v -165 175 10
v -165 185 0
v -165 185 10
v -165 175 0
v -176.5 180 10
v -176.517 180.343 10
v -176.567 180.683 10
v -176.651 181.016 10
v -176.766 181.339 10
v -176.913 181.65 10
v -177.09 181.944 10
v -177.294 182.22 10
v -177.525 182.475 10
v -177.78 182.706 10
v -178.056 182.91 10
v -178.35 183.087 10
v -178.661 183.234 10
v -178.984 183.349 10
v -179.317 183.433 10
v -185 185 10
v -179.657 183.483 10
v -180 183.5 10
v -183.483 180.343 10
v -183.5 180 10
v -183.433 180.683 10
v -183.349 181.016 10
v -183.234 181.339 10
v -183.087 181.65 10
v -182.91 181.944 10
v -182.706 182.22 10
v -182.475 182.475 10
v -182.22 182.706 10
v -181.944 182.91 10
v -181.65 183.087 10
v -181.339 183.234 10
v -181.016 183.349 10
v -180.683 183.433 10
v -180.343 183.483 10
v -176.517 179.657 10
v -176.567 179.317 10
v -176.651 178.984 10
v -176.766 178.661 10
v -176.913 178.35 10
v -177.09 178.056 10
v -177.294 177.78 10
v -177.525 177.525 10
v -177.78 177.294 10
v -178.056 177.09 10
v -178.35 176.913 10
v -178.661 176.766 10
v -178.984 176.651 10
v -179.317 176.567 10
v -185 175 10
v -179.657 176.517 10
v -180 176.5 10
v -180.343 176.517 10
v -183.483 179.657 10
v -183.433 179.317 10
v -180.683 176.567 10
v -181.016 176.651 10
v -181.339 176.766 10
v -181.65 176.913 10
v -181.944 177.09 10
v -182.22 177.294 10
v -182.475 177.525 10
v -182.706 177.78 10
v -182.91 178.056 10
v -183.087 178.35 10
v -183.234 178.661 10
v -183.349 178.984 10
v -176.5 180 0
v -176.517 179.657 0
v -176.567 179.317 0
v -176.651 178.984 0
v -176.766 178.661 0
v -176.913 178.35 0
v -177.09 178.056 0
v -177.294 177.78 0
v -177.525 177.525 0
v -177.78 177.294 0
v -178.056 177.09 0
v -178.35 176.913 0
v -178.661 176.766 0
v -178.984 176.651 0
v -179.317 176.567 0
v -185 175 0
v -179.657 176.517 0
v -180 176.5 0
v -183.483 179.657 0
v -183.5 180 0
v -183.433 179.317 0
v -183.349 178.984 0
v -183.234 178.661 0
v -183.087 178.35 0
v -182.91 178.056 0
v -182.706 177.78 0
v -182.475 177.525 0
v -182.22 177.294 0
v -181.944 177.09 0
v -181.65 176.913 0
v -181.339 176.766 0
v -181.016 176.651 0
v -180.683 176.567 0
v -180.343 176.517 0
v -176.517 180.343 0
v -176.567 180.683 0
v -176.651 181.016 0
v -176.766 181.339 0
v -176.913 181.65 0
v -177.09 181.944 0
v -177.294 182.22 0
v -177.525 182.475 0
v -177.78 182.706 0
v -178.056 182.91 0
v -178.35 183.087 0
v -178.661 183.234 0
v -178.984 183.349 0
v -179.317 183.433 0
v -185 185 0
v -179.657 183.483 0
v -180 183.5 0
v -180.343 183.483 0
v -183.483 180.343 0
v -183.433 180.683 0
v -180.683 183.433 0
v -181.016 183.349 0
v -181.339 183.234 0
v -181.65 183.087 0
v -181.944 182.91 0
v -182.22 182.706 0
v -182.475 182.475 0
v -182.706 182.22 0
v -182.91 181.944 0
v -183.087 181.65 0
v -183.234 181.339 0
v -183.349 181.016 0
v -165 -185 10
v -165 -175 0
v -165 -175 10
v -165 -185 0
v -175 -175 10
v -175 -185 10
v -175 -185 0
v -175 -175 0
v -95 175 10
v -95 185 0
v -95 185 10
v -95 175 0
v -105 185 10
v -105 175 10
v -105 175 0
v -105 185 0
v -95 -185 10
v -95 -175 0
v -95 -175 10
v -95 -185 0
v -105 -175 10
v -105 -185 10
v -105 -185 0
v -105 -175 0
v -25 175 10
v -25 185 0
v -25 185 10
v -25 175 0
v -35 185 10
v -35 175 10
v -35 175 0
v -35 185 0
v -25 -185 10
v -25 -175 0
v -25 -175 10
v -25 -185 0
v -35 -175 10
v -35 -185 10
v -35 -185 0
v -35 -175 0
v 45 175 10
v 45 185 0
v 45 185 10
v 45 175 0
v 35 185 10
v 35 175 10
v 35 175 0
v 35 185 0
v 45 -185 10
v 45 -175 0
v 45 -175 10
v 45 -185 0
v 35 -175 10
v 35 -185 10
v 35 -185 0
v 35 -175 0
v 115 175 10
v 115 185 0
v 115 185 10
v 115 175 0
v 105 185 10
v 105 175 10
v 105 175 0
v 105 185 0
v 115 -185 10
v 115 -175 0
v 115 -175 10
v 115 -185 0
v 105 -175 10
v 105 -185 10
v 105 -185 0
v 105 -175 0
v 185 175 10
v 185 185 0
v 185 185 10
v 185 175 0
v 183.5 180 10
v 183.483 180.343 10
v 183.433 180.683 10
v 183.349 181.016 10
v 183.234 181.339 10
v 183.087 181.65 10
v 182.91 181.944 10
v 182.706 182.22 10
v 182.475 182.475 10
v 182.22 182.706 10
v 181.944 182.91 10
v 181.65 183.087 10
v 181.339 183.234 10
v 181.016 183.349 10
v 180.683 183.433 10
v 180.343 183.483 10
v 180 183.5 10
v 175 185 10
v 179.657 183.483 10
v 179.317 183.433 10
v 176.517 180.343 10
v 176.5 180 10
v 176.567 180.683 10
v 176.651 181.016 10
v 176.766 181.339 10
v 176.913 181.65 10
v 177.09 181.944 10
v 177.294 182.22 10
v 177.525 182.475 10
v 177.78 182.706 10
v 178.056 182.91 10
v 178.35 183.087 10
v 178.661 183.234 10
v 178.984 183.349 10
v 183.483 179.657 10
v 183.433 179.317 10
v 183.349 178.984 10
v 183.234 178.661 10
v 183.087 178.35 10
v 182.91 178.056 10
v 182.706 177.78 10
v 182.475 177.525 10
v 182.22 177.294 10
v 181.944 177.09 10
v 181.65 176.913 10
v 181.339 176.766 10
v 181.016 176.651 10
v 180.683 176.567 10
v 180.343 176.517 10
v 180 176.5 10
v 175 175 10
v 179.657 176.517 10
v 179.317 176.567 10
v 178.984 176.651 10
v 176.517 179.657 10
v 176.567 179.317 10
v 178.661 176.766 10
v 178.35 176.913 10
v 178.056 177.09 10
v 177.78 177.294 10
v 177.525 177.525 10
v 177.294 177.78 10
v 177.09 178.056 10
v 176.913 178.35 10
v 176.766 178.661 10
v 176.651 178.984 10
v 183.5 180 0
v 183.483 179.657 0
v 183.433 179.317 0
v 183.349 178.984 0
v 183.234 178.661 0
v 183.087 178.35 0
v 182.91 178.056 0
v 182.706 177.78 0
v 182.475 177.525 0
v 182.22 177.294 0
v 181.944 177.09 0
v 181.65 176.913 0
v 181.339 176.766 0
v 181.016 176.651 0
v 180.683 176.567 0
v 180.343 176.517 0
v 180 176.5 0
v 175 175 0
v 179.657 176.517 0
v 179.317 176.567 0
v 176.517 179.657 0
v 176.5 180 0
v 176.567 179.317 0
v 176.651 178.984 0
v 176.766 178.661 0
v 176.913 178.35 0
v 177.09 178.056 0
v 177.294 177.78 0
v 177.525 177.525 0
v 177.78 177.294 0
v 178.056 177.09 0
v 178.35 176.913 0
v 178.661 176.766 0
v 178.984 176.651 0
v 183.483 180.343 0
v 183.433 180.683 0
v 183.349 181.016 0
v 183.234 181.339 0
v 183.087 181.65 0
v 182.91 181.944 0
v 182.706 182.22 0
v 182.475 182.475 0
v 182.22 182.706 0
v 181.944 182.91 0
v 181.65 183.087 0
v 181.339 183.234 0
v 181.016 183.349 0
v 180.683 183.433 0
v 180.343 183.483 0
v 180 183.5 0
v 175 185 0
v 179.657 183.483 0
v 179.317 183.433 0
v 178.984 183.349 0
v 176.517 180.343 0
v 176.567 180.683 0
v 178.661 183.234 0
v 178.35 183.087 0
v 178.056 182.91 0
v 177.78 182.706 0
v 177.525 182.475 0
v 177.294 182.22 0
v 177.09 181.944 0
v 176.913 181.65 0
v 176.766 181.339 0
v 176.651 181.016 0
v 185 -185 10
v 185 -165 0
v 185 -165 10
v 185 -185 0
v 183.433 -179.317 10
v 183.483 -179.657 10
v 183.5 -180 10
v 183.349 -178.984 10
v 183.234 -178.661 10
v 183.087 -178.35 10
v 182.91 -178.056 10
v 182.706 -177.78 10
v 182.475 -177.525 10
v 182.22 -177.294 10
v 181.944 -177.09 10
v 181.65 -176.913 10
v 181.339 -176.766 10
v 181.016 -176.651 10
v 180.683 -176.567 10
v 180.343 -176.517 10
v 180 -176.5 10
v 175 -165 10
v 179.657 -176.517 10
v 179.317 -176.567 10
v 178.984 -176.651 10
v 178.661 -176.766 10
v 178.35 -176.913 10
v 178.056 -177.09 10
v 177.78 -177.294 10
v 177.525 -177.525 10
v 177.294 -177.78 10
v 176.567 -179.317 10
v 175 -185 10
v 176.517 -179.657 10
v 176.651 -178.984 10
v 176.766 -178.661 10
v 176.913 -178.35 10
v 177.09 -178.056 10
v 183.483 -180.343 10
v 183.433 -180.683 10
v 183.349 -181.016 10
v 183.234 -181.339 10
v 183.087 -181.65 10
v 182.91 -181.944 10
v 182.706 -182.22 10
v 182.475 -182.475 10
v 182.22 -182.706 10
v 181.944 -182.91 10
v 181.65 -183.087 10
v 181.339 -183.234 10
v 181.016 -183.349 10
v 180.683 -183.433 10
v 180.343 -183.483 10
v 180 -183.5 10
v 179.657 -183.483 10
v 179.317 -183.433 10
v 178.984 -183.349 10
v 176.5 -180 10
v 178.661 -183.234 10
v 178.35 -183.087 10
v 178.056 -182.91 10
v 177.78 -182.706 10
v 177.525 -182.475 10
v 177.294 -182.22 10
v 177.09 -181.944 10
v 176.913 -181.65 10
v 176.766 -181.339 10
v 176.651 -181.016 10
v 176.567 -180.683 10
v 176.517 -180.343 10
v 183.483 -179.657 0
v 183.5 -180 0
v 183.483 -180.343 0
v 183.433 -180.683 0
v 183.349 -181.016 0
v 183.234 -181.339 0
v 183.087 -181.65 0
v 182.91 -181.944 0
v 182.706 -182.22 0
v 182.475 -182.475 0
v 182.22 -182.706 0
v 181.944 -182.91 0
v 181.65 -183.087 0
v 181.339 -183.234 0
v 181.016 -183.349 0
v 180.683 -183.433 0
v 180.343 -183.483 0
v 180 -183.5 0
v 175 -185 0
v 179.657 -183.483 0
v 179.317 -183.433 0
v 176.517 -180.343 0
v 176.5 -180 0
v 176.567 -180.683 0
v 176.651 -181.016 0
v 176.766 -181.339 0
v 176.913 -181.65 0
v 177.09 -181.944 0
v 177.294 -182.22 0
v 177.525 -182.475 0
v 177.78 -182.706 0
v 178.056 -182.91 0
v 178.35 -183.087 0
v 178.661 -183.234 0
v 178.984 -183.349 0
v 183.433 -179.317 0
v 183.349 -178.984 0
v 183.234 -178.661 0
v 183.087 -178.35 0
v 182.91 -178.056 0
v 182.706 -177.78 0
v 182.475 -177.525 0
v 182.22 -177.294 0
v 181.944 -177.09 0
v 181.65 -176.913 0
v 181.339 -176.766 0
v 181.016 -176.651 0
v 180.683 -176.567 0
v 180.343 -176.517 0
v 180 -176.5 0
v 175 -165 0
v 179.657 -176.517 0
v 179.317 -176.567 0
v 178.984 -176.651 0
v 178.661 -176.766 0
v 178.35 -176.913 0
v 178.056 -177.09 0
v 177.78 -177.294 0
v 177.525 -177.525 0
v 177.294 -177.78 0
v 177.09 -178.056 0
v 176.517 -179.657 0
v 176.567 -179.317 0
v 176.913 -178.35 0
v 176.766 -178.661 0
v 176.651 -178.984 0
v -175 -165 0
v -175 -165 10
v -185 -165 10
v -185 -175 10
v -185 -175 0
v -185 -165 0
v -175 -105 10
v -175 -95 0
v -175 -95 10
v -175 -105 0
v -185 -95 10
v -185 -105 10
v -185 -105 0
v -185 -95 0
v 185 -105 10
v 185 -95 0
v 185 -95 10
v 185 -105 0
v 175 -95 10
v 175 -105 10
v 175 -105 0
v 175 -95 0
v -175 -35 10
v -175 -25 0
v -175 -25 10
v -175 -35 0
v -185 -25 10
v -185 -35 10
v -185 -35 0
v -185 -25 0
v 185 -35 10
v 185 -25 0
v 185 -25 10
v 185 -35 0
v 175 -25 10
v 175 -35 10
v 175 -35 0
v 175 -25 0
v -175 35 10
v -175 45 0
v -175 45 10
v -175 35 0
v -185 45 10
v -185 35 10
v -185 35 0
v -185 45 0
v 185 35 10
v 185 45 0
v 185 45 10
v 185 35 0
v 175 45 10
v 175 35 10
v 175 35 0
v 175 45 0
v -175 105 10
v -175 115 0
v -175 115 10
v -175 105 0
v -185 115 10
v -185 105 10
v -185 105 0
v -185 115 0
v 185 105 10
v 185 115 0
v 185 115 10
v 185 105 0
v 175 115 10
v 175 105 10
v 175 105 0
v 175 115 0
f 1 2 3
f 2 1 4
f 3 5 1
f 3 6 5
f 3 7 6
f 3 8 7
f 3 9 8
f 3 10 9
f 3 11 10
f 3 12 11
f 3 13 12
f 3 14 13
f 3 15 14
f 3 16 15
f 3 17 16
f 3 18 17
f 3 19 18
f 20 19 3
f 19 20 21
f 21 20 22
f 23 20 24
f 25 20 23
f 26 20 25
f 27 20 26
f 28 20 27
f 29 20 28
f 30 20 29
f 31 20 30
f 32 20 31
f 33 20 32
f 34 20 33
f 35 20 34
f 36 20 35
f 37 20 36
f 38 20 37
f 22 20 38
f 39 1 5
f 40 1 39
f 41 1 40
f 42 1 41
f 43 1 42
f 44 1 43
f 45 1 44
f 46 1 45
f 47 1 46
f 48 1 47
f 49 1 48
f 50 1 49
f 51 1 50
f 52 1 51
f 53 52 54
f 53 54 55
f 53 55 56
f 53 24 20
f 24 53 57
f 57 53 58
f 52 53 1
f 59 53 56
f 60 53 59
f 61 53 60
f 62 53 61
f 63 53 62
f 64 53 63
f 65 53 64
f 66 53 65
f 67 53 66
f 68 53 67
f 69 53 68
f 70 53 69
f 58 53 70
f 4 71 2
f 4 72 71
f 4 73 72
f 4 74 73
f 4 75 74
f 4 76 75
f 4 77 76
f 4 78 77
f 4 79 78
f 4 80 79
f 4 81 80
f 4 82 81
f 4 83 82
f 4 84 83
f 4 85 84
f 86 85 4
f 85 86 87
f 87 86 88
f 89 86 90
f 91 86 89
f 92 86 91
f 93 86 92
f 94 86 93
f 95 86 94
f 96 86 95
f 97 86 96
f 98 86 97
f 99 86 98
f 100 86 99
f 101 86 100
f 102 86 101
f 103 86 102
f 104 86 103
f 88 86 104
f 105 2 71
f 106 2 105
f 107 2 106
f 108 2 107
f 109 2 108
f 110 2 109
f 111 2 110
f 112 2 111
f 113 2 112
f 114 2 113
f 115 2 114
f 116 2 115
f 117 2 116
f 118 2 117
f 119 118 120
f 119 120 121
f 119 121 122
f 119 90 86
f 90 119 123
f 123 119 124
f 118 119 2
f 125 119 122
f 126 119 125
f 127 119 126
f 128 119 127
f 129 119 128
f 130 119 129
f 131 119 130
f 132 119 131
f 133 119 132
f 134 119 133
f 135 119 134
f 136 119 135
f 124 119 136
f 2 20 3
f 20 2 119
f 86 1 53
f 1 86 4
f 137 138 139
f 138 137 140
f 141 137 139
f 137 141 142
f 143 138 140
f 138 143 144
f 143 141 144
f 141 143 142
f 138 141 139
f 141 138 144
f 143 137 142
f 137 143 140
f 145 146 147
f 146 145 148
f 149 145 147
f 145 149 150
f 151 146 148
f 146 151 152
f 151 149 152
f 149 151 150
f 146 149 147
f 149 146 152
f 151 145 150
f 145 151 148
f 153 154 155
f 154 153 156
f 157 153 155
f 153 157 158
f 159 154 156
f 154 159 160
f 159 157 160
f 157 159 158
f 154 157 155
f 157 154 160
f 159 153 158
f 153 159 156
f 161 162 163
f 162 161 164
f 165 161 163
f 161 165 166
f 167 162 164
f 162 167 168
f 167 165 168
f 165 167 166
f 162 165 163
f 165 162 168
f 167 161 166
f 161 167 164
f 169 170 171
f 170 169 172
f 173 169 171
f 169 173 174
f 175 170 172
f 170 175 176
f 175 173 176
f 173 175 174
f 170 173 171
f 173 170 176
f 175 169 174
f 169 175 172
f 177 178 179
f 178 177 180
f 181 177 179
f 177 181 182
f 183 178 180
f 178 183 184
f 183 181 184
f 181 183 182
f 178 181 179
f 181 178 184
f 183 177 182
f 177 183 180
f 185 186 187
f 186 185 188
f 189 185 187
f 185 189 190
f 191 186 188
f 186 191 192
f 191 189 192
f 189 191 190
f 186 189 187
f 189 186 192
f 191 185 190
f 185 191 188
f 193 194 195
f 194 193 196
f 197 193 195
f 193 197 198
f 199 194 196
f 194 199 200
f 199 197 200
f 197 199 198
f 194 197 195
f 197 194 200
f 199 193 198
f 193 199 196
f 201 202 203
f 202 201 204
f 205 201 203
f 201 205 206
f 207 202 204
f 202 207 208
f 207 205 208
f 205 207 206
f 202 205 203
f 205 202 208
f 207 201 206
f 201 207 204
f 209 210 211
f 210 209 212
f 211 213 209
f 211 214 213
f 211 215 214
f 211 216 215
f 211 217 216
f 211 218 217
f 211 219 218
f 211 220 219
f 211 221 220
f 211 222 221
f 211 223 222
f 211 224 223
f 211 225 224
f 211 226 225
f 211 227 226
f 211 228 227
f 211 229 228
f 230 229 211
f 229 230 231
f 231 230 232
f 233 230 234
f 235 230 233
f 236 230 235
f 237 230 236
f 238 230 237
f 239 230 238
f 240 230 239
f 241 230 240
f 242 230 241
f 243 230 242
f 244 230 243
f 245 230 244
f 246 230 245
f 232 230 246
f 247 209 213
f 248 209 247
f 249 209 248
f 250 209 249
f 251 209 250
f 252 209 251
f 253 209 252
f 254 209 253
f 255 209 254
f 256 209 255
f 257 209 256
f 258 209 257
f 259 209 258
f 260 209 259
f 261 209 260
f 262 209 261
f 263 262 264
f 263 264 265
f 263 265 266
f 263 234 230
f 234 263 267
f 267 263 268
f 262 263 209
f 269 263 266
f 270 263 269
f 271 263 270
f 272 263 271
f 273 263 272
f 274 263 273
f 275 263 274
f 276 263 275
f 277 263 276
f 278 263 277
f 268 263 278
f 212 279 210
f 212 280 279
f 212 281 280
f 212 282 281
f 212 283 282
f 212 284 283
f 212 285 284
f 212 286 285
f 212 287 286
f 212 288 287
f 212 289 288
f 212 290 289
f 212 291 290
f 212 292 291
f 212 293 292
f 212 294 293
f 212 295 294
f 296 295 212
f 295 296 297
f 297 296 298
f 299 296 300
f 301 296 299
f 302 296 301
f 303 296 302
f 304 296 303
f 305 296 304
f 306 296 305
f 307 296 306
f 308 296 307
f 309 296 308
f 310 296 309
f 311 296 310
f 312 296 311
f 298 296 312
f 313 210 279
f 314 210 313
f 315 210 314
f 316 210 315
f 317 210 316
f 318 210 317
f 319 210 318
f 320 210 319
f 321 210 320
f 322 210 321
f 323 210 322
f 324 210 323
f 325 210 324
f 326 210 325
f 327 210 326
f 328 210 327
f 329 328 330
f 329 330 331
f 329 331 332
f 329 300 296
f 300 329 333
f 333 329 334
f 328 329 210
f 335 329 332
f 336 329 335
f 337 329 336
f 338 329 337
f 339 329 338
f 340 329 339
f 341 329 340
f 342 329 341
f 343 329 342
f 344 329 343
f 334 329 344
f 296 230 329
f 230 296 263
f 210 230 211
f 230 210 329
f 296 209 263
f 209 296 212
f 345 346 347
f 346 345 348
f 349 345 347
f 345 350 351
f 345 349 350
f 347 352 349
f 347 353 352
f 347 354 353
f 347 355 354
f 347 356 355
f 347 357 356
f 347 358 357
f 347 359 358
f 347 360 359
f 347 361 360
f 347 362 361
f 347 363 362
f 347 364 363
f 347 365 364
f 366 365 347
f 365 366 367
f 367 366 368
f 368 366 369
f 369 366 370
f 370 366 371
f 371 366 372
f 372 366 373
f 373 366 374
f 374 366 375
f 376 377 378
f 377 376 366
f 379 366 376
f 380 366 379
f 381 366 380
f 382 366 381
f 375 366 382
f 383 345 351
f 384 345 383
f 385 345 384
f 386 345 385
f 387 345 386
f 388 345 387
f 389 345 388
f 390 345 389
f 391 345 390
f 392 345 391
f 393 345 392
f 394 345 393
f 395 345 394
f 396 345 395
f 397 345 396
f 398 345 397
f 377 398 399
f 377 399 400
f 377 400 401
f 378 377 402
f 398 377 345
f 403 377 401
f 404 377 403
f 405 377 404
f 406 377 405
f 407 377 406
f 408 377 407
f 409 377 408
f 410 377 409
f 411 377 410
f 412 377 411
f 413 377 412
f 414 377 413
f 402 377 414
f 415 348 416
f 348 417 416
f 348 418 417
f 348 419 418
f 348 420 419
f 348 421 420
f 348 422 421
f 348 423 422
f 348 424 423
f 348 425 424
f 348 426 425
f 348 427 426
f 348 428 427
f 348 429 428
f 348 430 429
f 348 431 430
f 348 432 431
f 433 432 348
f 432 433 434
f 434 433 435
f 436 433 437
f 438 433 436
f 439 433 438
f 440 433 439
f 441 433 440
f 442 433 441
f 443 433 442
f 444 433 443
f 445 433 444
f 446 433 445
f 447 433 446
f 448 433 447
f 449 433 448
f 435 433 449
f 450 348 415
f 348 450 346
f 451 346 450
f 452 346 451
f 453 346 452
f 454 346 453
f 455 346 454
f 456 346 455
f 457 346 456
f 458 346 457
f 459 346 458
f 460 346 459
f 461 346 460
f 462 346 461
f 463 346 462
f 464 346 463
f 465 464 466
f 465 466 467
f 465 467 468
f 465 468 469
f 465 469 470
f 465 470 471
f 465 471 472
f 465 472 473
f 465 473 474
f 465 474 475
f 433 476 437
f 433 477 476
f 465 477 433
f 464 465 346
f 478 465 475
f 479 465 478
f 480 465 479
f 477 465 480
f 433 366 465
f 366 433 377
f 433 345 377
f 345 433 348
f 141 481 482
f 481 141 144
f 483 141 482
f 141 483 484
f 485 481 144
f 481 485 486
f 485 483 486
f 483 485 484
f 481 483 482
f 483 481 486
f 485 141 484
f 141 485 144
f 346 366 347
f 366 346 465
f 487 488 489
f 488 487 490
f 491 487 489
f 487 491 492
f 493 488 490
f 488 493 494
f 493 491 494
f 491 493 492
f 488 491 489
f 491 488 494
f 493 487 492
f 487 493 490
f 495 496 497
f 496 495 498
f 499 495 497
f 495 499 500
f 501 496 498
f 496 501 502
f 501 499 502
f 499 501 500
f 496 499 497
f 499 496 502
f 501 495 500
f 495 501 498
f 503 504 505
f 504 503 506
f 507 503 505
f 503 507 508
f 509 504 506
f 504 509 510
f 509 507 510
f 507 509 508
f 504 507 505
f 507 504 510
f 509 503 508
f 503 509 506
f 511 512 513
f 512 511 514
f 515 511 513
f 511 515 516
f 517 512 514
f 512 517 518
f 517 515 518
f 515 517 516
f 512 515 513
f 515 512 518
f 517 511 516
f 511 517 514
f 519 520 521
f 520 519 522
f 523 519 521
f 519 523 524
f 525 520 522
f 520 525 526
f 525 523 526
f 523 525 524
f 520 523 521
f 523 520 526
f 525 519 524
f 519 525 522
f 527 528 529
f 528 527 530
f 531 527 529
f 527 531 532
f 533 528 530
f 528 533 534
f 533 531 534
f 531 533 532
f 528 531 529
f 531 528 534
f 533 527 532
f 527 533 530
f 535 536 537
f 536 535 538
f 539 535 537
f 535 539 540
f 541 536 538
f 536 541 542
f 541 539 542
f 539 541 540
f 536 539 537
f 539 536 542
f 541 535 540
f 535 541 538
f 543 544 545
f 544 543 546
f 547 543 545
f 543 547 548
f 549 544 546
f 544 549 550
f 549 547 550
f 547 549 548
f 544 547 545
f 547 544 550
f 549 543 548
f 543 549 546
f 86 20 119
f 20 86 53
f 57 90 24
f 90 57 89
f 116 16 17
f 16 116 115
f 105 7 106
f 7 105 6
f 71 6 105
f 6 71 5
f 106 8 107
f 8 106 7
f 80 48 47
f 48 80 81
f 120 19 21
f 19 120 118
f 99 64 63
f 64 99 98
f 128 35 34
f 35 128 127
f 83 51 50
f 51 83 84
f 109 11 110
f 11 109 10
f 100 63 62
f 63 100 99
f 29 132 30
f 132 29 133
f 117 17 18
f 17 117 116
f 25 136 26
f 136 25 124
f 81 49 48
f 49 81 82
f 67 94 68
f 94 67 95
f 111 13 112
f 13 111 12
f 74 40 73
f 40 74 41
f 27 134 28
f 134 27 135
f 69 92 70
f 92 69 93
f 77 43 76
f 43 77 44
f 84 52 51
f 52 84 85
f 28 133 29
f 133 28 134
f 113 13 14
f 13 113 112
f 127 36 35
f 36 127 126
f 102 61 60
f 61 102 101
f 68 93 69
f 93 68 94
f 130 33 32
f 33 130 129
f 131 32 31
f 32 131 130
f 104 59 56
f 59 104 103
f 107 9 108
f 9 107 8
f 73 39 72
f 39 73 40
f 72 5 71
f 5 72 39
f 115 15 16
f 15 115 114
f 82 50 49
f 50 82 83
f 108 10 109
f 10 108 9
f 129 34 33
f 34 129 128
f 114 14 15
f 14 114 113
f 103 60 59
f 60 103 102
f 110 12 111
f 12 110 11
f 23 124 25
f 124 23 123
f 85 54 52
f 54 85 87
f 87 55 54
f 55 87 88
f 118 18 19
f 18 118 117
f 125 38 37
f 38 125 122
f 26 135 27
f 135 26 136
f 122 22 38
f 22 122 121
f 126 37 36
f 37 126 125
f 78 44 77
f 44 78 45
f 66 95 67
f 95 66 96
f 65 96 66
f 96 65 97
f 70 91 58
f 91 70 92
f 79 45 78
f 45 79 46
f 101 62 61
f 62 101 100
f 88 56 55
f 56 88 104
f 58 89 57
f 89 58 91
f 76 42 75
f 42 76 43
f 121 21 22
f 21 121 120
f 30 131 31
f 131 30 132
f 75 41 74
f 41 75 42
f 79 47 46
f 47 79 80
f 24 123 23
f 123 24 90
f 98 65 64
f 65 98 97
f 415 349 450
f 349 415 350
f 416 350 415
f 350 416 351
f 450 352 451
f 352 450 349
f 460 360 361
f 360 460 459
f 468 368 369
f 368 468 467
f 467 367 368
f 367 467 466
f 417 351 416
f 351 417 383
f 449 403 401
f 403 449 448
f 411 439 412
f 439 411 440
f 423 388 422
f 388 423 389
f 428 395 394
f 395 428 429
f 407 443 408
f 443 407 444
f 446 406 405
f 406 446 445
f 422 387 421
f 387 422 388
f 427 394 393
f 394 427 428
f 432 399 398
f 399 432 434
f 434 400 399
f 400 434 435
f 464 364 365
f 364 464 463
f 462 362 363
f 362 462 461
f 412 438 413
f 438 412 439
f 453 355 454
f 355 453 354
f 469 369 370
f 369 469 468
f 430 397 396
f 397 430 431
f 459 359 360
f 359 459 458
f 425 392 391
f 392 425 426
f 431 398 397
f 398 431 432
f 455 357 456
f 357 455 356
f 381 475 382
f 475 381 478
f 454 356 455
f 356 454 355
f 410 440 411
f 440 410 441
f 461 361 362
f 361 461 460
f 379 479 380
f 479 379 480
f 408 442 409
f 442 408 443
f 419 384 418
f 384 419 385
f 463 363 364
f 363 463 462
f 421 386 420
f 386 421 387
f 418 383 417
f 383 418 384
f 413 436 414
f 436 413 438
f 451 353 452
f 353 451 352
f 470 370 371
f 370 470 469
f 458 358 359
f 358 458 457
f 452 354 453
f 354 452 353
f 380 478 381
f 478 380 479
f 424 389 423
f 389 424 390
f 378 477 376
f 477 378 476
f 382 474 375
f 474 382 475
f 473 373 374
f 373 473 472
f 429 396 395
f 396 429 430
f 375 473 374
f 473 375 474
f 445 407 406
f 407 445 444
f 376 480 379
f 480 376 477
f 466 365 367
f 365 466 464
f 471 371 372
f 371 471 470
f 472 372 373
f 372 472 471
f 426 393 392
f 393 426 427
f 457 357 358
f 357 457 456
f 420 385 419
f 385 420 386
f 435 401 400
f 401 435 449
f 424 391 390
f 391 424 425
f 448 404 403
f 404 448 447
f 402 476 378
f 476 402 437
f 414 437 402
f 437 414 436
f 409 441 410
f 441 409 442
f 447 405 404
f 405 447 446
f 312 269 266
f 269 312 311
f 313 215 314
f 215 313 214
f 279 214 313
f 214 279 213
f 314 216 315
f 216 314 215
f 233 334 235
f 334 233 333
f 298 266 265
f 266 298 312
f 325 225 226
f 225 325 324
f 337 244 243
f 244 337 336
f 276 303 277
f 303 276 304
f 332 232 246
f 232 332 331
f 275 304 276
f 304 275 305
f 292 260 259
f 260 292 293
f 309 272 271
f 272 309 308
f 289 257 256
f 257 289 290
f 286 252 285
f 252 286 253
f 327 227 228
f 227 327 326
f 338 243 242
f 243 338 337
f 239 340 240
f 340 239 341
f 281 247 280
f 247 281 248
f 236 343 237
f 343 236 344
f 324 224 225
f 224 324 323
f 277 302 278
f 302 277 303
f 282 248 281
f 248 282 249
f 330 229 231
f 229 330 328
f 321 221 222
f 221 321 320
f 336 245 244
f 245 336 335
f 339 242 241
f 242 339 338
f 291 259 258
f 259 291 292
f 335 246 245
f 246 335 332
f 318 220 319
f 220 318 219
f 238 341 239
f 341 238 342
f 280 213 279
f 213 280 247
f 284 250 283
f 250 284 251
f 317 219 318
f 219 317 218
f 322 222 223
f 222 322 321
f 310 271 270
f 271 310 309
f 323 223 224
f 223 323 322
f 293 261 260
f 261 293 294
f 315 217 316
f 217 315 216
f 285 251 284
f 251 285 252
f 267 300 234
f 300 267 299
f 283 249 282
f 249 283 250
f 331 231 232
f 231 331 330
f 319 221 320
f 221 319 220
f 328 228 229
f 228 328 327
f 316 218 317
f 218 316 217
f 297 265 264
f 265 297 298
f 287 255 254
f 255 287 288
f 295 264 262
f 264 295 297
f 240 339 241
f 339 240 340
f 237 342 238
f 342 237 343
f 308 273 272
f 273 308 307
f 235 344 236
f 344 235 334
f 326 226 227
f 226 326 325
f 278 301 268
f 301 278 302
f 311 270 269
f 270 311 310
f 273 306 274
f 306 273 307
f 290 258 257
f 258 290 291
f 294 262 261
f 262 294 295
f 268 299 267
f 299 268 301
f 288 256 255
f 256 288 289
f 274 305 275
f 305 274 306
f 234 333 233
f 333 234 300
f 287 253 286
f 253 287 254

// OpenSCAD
// ring_42.scad - ring index 42 (z bottom = 420 mm)
$fn = 64; bar = 10; half_b = bar/2; outer = 370; half_outer = outer/2;
front_y = 180; back_y = -180; left_x = -180; right_x = 180;
x_centers = [-170, -100, -30, 40, 110, 180];
z_centers = [5, 85, 155, 225, 295, 365, 435, 505, 575, 645, 715]; ring_z = 420;
module place_box(cx, cy, sx, sy) { translate([cx - sx/2, cy - sy/2, 0]) cube([sx, sy, bar]); }

difference() { union() {
    for (x = x_centers) { place_box(x, front_y, bar, bar); place_box(x, back_y, bar, bar); }
    for (y = x_centers) { place_box(left_x, y, bar, bar); place_box(right_x, y, bar, bar); }
    for (zc = z_centers) if ((zc - half_b < ring_z + bar) && (zc + half_b > ring_z)) {
        translate([-half_outer, front_y - half_b, 0]) cube([outer, bar, bar]);
        translate([-half_outer, back_y - half_b, 0])  cube([outer, bar, bar]);
        translate([left_x - half_b, -half_outer, 0])  cube([bar, outer, bar]);
        translate([right_x - half_b, -half_outer, 0]) cube([bar, outer, bar]);
    }
  }
  for (cx = [-180, 180]) for (cy = [-180, 180]) translate([cx, cy, 0]) cylinder(h = bar, r = 3.5, $fn = 64);
}
